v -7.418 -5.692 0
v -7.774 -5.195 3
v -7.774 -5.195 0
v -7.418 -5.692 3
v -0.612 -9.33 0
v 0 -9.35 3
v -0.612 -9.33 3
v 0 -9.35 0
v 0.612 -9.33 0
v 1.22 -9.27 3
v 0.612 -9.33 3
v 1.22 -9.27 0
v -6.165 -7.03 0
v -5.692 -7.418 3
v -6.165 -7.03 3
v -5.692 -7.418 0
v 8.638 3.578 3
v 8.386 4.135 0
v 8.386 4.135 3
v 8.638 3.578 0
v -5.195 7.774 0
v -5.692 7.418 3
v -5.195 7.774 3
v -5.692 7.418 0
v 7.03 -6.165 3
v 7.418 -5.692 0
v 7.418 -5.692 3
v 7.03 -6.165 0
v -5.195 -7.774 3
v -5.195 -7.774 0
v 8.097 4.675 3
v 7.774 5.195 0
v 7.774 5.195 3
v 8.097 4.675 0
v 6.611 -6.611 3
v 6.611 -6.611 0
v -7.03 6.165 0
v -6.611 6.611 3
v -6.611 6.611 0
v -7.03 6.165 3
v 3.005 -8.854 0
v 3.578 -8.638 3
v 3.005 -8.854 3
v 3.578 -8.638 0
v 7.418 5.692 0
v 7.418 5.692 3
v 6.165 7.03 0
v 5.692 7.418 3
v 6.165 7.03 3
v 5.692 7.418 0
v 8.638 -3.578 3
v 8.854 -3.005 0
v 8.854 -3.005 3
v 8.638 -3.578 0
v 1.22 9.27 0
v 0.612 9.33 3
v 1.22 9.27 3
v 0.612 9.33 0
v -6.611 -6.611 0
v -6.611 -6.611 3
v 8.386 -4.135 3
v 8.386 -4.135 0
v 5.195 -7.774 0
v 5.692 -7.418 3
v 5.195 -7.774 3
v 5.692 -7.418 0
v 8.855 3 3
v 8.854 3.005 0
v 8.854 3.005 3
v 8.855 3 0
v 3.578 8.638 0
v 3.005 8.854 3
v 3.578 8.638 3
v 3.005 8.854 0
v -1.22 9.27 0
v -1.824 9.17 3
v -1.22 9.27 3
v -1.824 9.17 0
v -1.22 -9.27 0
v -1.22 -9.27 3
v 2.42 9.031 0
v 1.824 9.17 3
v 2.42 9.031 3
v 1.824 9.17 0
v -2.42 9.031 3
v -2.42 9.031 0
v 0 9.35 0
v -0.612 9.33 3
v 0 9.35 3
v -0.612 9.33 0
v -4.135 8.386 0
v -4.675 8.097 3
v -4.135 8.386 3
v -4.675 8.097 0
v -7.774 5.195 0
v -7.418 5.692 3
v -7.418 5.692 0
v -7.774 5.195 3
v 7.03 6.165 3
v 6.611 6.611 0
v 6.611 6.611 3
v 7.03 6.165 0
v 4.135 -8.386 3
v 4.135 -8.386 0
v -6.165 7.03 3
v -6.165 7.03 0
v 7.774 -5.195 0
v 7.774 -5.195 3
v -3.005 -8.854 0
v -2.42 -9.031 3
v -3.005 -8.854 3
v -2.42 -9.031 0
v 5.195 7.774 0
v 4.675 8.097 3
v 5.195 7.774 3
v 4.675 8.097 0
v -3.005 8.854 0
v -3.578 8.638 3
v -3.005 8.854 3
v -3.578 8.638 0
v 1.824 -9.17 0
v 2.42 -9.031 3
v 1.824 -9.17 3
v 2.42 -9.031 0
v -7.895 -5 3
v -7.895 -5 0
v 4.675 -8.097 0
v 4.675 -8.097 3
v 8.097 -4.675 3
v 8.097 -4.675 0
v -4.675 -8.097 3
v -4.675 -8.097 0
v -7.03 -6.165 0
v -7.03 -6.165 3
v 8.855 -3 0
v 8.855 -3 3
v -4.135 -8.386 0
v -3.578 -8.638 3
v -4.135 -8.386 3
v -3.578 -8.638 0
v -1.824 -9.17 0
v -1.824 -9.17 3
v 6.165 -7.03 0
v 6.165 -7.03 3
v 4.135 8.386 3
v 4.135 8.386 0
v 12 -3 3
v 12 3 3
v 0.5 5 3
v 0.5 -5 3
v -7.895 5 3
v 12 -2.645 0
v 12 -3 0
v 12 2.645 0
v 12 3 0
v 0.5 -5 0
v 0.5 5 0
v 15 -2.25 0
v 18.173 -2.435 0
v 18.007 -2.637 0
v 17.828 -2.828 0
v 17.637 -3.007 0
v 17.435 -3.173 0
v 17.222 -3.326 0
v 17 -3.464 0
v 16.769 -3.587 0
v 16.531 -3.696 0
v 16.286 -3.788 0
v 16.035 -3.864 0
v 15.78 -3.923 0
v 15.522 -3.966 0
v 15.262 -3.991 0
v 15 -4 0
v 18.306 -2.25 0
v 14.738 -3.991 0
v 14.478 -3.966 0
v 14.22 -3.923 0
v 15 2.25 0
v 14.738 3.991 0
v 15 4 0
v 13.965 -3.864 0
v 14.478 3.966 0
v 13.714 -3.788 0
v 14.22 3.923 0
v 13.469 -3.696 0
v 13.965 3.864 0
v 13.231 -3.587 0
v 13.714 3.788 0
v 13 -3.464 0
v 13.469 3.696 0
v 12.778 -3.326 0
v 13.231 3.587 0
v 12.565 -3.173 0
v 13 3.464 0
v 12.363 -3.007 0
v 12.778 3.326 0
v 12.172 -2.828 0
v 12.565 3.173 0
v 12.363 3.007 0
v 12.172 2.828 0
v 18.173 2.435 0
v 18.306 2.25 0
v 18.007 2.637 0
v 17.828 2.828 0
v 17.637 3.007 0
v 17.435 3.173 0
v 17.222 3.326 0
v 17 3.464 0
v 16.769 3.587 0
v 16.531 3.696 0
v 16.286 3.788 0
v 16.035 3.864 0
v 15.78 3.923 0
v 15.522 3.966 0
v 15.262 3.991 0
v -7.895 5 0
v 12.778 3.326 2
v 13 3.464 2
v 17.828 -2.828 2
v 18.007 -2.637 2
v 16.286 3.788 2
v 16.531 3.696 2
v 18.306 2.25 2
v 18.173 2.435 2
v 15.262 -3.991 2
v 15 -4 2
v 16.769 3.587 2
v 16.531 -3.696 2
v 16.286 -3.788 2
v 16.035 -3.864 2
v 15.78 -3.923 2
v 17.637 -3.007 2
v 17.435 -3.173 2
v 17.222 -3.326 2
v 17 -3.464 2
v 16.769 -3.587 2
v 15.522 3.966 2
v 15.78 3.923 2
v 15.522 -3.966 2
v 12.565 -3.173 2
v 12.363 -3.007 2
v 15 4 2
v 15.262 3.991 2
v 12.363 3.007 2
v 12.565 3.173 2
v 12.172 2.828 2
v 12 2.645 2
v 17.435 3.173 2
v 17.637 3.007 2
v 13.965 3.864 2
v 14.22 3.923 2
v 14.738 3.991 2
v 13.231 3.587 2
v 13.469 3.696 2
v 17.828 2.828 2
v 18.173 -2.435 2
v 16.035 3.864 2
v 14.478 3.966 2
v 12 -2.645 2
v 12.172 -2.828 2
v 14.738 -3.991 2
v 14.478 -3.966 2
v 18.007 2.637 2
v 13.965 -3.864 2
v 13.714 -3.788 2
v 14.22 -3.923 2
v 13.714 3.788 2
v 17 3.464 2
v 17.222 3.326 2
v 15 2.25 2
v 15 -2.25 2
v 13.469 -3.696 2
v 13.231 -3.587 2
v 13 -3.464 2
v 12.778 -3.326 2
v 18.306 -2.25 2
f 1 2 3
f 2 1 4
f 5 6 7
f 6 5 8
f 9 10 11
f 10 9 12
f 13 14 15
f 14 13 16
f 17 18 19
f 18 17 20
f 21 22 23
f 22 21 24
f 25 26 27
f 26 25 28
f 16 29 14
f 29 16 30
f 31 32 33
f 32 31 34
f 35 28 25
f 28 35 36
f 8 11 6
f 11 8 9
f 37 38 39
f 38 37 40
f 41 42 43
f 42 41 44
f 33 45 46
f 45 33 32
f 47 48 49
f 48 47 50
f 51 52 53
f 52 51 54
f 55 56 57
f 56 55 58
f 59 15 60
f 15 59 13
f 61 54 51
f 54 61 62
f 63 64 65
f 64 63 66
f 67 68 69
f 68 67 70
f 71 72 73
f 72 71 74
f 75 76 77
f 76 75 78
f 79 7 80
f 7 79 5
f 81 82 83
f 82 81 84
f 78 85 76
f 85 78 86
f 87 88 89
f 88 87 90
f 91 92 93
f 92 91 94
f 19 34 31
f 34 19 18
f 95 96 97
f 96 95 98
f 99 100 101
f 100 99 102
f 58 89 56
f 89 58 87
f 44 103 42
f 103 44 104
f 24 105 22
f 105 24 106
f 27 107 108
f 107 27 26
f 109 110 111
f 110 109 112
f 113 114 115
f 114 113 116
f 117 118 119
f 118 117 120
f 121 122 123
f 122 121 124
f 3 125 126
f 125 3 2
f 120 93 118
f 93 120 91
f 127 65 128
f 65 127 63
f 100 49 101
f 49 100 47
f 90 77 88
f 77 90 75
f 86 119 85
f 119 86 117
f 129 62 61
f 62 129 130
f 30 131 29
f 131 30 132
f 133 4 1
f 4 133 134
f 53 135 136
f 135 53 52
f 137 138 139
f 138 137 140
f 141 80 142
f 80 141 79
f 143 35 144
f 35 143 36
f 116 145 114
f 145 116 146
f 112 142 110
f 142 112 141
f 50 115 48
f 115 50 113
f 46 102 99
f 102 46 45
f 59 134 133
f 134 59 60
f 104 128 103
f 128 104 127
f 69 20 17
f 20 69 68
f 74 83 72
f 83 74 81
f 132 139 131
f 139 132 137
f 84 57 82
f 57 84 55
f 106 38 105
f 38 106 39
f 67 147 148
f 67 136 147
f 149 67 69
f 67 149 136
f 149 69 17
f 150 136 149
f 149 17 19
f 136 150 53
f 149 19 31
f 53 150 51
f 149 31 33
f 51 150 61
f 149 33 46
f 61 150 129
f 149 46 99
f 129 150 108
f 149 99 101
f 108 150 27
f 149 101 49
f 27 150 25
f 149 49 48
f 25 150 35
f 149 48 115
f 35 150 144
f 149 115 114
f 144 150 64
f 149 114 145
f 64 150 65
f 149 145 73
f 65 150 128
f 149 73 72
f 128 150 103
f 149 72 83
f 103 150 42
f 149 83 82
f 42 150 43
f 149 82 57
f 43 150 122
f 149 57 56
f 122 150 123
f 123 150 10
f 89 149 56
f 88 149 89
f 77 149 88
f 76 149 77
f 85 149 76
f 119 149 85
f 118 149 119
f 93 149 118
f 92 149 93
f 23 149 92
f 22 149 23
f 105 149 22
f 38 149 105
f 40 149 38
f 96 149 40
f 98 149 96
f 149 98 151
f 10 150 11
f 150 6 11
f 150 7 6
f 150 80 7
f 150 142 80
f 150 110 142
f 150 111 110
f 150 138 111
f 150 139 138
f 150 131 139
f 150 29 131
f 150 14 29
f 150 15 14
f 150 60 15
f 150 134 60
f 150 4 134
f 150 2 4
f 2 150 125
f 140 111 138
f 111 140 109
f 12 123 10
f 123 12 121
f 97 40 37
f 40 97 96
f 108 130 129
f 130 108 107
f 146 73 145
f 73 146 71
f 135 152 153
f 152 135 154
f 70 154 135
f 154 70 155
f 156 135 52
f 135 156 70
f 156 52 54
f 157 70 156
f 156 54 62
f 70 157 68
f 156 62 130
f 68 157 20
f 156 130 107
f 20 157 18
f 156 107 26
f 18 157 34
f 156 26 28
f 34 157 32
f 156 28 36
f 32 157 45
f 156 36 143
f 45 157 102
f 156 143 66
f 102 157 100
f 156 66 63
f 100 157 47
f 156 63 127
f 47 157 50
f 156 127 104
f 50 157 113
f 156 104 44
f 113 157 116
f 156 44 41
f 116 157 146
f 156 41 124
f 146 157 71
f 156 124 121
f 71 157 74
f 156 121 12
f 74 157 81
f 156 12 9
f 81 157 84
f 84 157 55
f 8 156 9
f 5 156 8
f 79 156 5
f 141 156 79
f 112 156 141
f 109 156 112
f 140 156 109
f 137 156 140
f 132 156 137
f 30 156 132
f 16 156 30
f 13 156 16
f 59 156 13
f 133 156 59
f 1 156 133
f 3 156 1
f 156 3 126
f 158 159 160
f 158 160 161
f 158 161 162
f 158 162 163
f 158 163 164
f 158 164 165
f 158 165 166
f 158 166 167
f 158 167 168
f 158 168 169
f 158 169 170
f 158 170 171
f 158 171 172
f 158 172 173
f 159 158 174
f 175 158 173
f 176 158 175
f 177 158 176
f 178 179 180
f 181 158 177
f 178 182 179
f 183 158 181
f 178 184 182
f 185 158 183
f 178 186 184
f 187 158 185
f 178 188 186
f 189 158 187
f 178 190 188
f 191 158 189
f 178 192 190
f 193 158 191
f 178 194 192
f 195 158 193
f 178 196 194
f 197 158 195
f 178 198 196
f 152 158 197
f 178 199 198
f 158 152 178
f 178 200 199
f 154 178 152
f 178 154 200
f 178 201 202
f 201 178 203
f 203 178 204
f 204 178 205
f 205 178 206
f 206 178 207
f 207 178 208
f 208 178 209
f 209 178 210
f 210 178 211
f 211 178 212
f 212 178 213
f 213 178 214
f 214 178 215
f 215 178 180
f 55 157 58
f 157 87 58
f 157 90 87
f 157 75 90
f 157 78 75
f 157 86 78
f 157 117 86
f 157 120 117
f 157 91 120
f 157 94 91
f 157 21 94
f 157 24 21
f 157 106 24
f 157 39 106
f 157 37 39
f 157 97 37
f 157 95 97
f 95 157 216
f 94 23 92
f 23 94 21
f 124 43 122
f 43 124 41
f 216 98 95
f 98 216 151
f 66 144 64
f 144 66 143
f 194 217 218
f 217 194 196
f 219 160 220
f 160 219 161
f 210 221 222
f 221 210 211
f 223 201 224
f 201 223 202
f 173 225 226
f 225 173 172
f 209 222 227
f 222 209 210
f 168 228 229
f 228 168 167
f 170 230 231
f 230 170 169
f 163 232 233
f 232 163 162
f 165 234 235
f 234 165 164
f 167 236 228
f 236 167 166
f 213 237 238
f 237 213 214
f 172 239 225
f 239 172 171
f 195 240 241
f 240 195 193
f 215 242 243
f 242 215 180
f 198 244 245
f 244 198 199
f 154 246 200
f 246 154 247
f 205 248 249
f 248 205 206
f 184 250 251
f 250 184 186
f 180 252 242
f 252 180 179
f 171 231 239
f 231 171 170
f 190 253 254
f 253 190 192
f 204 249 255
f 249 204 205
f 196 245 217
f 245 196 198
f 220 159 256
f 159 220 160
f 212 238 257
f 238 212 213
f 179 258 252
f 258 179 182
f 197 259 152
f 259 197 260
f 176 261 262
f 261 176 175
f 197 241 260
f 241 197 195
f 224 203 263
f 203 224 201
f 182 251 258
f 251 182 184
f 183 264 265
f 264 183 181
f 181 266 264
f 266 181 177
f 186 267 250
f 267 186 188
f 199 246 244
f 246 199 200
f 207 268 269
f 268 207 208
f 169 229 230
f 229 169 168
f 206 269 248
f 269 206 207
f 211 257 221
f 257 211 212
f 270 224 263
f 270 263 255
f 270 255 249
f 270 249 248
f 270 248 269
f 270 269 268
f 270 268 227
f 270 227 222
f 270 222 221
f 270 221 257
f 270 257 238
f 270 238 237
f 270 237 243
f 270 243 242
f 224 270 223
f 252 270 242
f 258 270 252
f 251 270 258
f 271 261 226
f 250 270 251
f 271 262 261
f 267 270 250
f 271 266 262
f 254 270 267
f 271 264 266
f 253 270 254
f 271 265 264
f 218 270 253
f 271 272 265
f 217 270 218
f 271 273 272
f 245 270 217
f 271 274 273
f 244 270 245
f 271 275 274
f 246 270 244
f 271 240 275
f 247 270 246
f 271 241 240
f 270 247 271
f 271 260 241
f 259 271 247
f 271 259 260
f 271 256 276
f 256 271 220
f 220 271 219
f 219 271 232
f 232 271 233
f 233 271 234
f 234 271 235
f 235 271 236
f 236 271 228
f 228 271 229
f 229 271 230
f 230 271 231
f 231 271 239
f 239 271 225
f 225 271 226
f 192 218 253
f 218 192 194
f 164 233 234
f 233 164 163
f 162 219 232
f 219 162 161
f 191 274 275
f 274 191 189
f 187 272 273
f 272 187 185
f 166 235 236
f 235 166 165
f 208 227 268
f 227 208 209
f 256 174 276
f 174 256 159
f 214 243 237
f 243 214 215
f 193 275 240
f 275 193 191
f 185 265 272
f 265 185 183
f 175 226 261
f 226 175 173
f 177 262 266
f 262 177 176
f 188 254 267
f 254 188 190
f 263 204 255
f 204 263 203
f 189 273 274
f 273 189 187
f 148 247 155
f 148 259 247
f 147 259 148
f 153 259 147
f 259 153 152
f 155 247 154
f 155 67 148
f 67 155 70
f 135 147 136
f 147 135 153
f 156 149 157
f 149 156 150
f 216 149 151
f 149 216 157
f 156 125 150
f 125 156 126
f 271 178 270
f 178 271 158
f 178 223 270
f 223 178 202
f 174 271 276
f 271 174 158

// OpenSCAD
// Snap-on clip for tubing next to a 12.7 mm lab stand rod
// Printed flat: 2-D profile in XY, extruded along +Z

// ---- Rod ring ----
ring_od = 18.7;      // outer diameter of rod ring
ring_id = 12.7;      // inner diameter of rod ring
ring_w  = 3;         // wall thickness of rod ring

// ---- Tubing ring ----
tube_od = 8;         // outer diameter of tubing ring
tube_id = 6;         // inner diameter of tubing ring
tube_w  = 2;         // wall thickness of tubing ring

// ---- Bridge ----
bridge_x0 = 8;       // start X of bridge
bridge_x1 = 12;      // end X of bridge
bridge_y  = 6;       // bridge width (Y)

// ---- Misc ----
eps = 0.5;           // overshoot for clean boolean cuts
$fn = 96;            // curve resolution

difference() {
    union() {
        // Rod ring, centred at origin
        cylinder(d = ring_od, h = ring_w);

        // Tubing ring, centred at x = 15, y = 0
        translate([15, 0, 0])
            cylinder(d = tube_od, h = tube_w);

        // Solid bridge between x = 8 and x = 12
        translate([bridge_x0, -bridge_y / 2, 0])
            cube([bridge_x1 - bridge_x0, bridge_y, ring_w]);
    }

    // Opening for the stand rod: x < 0, -5 < y < 5
    translate([-ring_od - eps, -5, -eps])
        cube([ring_od + 2 * eps, 10, ring_w + 2 * eps]);

    // Opening for the tubing: x > 15, -2.25 < y < 2.25
    translate([15, -2.25, -eps])
        cube([tube_od + 2 * eps + 1, 4.5, tube_w + 2 * eps]);
}
